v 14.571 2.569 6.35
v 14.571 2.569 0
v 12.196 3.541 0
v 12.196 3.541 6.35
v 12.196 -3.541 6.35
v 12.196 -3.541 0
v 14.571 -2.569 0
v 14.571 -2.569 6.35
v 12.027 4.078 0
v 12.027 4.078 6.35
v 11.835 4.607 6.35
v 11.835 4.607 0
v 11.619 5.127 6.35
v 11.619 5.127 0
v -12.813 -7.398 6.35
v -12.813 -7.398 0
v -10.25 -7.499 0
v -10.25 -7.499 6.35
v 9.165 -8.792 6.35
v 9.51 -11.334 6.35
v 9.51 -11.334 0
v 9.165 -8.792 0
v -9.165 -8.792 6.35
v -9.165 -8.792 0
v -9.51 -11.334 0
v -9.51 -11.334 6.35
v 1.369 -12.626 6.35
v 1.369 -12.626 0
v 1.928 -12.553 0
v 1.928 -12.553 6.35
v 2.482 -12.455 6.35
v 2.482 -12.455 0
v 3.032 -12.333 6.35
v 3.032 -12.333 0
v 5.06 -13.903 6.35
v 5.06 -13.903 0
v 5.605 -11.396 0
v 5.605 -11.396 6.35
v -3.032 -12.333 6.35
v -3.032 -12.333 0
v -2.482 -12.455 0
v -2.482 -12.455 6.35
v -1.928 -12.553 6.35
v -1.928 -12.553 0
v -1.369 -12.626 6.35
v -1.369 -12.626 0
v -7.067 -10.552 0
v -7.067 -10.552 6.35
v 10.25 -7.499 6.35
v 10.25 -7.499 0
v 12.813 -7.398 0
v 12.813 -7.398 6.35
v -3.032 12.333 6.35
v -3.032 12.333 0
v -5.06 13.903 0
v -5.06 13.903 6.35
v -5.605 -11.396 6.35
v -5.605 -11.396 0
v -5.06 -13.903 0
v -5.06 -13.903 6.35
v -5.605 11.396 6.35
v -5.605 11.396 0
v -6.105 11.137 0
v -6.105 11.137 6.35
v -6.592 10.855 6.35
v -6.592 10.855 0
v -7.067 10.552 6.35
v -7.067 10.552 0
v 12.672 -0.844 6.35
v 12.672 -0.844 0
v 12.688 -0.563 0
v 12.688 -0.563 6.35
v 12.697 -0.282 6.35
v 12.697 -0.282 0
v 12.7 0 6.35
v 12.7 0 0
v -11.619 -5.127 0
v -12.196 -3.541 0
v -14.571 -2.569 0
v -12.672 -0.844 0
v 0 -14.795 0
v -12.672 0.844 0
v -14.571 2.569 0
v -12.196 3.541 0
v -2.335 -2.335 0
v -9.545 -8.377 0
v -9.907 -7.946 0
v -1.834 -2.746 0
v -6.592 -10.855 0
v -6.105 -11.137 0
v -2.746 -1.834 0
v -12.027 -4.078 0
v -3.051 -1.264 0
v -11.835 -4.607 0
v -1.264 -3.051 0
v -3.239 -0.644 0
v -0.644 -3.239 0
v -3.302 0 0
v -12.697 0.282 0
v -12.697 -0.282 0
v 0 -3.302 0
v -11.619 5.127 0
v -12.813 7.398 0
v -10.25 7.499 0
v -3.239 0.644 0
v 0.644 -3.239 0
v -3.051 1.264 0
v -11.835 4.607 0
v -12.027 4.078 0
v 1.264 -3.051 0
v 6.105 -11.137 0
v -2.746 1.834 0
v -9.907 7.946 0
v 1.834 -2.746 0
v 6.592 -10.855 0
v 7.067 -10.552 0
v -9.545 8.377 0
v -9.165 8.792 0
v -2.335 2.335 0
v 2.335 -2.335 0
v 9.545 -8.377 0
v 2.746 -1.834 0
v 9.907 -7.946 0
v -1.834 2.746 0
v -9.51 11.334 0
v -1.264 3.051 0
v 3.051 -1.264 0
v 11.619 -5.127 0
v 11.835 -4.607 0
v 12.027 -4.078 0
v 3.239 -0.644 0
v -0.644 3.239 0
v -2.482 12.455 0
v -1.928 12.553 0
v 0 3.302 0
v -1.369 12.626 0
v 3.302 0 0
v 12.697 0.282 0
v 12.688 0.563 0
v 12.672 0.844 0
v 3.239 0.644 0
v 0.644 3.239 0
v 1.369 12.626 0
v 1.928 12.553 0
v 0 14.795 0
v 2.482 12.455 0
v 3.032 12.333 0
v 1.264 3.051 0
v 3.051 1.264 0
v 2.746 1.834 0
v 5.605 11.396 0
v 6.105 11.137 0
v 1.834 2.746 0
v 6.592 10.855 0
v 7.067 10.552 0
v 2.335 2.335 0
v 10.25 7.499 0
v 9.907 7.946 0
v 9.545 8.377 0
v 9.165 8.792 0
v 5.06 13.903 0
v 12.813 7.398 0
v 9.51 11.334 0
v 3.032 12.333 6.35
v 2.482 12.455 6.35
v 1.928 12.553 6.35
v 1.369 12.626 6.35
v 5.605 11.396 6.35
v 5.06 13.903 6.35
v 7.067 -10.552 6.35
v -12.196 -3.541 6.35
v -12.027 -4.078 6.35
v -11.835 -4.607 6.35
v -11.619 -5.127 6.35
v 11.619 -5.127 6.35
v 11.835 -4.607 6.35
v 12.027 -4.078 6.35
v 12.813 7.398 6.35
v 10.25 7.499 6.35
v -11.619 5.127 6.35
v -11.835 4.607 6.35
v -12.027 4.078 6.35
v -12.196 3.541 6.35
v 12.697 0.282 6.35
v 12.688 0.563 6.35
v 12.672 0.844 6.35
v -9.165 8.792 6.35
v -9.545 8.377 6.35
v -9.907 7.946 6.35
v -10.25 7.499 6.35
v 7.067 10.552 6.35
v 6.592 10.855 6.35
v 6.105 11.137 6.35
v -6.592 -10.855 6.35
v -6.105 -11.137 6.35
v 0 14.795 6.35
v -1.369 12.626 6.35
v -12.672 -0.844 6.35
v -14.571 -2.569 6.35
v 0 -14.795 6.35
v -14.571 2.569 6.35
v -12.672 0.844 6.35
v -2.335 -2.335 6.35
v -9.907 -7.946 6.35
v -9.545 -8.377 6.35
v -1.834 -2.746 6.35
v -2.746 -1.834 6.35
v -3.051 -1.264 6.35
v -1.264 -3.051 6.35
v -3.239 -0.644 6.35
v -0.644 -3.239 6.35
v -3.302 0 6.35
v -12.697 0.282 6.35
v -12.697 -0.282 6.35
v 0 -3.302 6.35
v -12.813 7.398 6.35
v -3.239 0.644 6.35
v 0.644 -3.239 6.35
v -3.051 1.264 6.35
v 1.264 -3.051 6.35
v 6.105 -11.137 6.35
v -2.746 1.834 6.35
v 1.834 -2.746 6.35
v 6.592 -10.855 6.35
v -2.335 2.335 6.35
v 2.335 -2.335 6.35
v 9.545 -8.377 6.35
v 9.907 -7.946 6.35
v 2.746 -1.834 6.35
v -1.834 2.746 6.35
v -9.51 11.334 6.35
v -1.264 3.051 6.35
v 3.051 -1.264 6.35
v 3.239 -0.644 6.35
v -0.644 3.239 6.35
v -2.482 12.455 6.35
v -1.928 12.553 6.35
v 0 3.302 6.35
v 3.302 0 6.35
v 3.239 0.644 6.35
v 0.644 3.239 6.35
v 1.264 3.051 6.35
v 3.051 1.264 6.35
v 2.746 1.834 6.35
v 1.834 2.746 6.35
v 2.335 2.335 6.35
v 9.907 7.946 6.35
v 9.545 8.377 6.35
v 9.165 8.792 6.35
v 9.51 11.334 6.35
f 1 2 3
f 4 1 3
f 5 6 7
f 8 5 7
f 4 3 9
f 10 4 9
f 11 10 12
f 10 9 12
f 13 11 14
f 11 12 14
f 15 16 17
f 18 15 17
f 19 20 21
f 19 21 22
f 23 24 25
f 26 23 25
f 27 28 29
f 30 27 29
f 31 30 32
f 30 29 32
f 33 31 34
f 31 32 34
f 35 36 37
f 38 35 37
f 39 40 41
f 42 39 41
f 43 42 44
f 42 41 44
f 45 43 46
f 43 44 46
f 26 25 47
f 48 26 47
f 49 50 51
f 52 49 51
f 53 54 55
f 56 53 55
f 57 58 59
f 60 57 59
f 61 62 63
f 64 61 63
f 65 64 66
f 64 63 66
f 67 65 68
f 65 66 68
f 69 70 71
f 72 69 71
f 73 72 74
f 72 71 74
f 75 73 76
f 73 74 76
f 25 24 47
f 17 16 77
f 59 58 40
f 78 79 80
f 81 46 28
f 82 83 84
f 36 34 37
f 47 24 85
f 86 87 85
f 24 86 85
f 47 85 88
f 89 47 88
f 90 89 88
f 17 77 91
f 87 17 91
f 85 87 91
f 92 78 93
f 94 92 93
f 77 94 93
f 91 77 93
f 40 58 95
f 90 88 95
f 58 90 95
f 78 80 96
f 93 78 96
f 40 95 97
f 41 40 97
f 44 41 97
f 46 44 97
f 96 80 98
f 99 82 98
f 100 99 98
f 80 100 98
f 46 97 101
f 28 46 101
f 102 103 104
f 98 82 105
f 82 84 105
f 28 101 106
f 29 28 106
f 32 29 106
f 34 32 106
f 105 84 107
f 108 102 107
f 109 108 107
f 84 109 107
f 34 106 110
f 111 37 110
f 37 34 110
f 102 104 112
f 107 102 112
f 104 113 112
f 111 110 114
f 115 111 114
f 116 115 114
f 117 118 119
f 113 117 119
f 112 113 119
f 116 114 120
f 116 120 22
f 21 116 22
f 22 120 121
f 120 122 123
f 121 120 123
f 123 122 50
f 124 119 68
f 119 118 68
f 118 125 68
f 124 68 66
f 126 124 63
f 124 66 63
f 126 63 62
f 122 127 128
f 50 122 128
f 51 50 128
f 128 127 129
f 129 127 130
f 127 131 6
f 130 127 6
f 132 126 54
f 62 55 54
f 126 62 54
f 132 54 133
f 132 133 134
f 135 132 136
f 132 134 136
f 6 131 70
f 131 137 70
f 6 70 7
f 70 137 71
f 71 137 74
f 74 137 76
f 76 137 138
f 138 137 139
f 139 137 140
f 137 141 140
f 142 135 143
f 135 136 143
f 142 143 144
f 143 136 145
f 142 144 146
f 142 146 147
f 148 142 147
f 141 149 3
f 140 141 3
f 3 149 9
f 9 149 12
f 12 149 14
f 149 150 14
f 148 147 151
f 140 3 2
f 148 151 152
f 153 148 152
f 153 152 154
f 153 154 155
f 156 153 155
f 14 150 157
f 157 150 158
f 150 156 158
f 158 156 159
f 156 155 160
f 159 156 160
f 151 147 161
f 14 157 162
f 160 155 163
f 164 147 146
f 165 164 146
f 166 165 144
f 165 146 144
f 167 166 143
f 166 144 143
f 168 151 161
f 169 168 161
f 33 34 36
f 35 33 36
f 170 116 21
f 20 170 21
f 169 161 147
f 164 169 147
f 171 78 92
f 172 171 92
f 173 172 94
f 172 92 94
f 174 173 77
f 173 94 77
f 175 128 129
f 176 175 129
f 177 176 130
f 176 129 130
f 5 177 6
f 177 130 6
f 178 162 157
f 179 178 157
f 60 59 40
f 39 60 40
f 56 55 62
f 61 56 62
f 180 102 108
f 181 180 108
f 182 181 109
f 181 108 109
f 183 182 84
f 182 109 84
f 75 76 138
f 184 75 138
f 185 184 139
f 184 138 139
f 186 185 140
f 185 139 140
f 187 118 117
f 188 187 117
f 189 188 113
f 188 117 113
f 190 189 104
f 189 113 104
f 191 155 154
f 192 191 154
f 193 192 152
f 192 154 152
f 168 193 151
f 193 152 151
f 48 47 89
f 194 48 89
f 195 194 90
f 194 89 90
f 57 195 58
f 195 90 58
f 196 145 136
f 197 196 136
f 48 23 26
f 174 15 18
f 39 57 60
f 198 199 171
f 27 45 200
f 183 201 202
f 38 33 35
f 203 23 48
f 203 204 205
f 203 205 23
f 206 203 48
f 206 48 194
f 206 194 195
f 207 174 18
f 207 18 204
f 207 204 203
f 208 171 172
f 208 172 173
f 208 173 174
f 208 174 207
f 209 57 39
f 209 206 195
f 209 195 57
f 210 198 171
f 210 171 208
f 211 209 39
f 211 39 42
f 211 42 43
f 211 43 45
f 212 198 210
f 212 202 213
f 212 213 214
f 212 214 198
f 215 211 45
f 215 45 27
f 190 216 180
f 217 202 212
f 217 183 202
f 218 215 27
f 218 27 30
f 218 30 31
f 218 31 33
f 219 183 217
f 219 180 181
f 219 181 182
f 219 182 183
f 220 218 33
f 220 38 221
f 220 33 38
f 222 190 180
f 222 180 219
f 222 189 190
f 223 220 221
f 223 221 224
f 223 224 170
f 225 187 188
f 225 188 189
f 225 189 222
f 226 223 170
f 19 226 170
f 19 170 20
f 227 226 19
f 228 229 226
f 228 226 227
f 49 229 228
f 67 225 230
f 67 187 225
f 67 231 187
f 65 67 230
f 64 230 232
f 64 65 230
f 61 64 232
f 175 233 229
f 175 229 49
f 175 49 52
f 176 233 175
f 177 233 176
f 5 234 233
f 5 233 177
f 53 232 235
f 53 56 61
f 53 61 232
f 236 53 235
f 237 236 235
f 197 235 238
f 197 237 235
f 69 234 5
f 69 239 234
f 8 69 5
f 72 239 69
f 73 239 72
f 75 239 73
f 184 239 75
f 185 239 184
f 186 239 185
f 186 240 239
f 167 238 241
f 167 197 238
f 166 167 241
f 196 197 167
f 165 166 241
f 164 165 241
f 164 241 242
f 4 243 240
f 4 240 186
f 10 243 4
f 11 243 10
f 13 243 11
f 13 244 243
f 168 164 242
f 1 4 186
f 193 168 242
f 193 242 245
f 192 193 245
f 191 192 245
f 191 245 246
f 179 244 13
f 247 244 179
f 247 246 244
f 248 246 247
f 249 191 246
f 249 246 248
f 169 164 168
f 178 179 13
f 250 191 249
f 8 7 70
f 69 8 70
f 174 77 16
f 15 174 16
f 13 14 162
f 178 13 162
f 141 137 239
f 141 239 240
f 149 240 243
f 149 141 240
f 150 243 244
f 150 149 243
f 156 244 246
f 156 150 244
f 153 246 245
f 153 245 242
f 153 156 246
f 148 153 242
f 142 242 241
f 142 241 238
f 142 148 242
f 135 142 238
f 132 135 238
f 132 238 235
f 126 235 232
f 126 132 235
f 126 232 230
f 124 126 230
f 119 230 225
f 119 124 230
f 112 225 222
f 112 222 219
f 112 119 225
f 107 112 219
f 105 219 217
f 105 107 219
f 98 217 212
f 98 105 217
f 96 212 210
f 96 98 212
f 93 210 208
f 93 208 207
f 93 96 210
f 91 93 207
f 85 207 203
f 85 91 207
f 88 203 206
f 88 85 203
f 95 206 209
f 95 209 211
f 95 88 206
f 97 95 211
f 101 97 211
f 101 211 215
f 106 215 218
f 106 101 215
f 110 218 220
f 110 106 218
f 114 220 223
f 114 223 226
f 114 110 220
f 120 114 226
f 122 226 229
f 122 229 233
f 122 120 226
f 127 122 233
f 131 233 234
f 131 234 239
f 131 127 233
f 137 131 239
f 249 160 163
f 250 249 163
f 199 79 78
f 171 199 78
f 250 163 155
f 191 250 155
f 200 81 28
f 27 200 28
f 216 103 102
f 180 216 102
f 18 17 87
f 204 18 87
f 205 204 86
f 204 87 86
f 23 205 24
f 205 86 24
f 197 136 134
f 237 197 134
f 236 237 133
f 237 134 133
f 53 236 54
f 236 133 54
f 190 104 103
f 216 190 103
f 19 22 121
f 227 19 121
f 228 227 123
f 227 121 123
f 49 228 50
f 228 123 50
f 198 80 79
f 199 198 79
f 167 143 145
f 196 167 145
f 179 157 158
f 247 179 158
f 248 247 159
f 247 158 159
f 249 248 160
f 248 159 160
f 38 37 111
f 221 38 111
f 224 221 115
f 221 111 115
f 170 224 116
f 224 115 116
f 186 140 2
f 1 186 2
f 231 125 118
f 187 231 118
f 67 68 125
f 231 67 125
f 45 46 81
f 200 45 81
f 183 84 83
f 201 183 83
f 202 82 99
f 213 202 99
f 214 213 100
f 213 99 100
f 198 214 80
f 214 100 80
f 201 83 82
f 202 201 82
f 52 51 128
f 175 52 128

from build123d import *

# Parameters (mm, degrees)
F0_R     = 3.302
F1_DEPTH = 6.35


with BuildPart() as f1:
    # F0 (on Top) → F1 (new body)
    with BuildSketch(Plane.XY):
        with BuildLine():
            ThreePointArc((12.671918, -0.844097), (12.692977, -0.422282), (12.7, 0))
            ThreePointArc((12.7, 0), (12.692977, 0.422282), (12.671918, 0.844097))
            ThreePointArc((12.671918, 0.844097), (12.507058, 2.205332), (12.196406, 3.540859))
            ThreePointArc((12.196406, 3.540859), (11.934096, 4.343656), (11.619009, 5.127243))
            ThreePointArc((11.619009, 5.127243), (10.998523, 6.35), (10.249828, 7.498736))
            ThreePointArc((10.249828, 7.498736), (9.728764, 8.163403), (9.164677, 8.791968))
            ThreePointArc((9.164677, 8.791968), (8.163403, 9.728764), (7.066969, 10.552154))
            ThreePointArc((7.066969, 10.552154), (6.35, 10.998523), (5.604949, 11.396251))
            ThreePointArc((5.604949, 11.396251), (4.343656, 11.934096), (3.031729, 12.332827))
            ThreePointArc((3.031729, 12.332827), (2.205332, 12.507058), (1.369182, 12.625979))
            ThreePointArc((1.369182, 12.625979), (0.685591, 12.681481), (0, 12.7))
            ThreePointArc((0, 12.7), (-0.685591, 12.681481), (-1.369182, 12.625979))
            ThreePointArc((-1.369182, 12.625979), (-2.205332, 12.507058), (-3.031729, 12.332827))
            ThreePointArc((-3.031729, 12.332827), (-4.343656, 11.934096), (-5.604949, 11.396251))
            ThreePointArc((-5.604949, 11.396251), (-6.35, 10.998523), (-7.066969, 10.552154))
            ThreePointArc((-7.066969, 10.552154), (-8.163403, 9.728764), (-9.164677, 8.791968))
            ThreePointArc((-9.164677, 8.791968), (-9.728764, 8.163403), (-10.249828, 7.498736))
            ThreePointArc((-10.249828, 7.498736), (-10.998523, 6.35), (-11.619009, 5.127243))
            ThreePointArc((-11.619009, 5.127243), (-11.934096, 4.343656), (-12.196406, 3.540859))
            ThreePointArc((-12.196406, 3.540859), (-12.507058, 2.205332), (-12.671918, 0.844097))
            ThreePointArc((-12.671918, 0.844097), (-12.7, 0), (-12.671918, -0.844097))
            ThreePointArc((-12.671918, -0.844097), (-12.507058, -2.205332), (-12.196406, -3.540859))
            ThreePointArc((-12.196406, -3.540859), (-11.934096, -4.343656), (-11.619009, -5.127243))
            ThreePointArc((-11.619009, -5.127243), (-10.998523, -6.35), (-10.249828, -7.498736))
            ThreePointArc((-10.249828, -7.498736), (-9.728764, -8.163403), (-9.164677, -8.791968))
            ThreePointArc((-9.164677, -8.791968), (-8.163403, -9.728764), (-7.066969, -10.552154))
            ThreePointArc((-7.066969, -10.552154), (-6.35, -10.998523), (-5.604949, -11.396251))
            ThreePointArc((-5.604949, -11.396251), (-4.343656, -11.934096), (-3.031729, -12.332827))
            ThreePointArc((-3.031729, -12.332827), (-2.205332, -12.507058), (-1.369182, -12.625979))
            ThreePointArc((-1.369182, -12.625979), (0, -12.7), (1.369182, -12.625979))
            ThreePointArc((1.369182, -12.625979), (2.205332, -12.507058), (3.031729, -12.332827))
            ThreePointArc((3.031729, -12.332827), (4.343656, -11.934096), (5.604949, -11.396251))
            ThreePointArc((5.604949, -11.396251), (6.35, -10.998523), (7.066969, -10.552154))
            ThreePointArc((7.066969, -10.552154), (8.163403, -9.728764), (9.164677, -8.791968))
            ThreePointArc((9.164677, -8.791968), (9.728764, -8.163403), (10.249828, -7.498736))
            ThreePointArc((10.249828, -7.498736), (10.998523, -6.35), (11.619009, -5.127243))
            ThreePointArc((11.619009, -5.127243), (11.934096, -4.343656), (12.196406, -3.540859))
            ThreePointArc((12.196406, -3.540859), (12.507058, -2.205332), (12.671918, -0.844097))
        make_face()
        Circle(F0_R, mode=Mode.SUBTRACT)
        with BuildLine():
            ThreePointArc((12.196406, 3.540859), (12.507058, 2.205332), (12.671918, 0.844097))
            Line((12.671918, 0.844097), (14.570677, 2.569203))
            Line((14.570677, 2.569203), (12.196406, 3.540859))
        make_face()
        with BuildLine():
            Line((14.570677, -2.569203), (12.671918, -0.844097))
            ThreePointArc((12.671918, -0.844097), (12.507058, -2.205332), (12.196406, -3.540859))
            Line((12.196406, -3.540859), (14.570677, -2.569203))
        make_face()
        with BuildLine():
            ThreePointArc((10.249828, 7.498736), (10.998523, 6.35), (11.619009, 5.127243))
            Line((11.619009, 5.127243), (12.813238, 7.397727))
            Line((12.813238, 7.397727), (10.249828, 7.498736))
        make_face()
        with BuildLine():
            Line((12.813238, -7.397727), (11.619009, -5.127243))
            ThreePointArc((11.619009, -5.127243), (10.998523, -6.35), (10.249828, -7.498736))
            Line((10.249828, -7.498736), (12.813238, -7.397727))
        make_face()
        with BuildLine():
            ThreePointArc((7.066969, 10.552154), (8.163403, 9.728764), (9.164677, 8.791968))
            Line((9.164677, 8.791968), (9.510334, 11.333975))
            Line((9.510334, 11.333975), (7.066969, 10.552154))
        make_face()
        with BuildLine():
            Line((9.510334, -11.333975), (9.164677, -8.791968))
            ThreePointArc((9.164677, -8.791968), (8.163403, -9.728764), (7.066969, -10.552154))
            Line((7.066969, -10.552154), (9.510334, -11.333975))
        make_face()
        with BuildLine():
            ThreePointArc((3.031729, 12.332827), (4.343656, 11.934096), (5.604949, 11.396251))
            Line((5.604949, 11.396251), (5.060343, 13.903178))
            Line((5.060343, 13.903178), (3.031729, 12.332827))
        make_face()
        with BuildLine():
            Line((5.060343, -13.903178), (5.604949, -11.396251))
            ThreePointArc((5.604949, -11.396251), (4.343656, -11.934096), (3.031729, -12.332827))
            Line((3.031729, -12.332827), (5.060343, -13.903178))
        make_face()
        with BuildLine():
            ThreePointArc((0, 12.7), (0.685591, 12.681481), (1.369182, 12.625979))
            Line((1.369182, 12.625979), (0, 14.795453))
            Line((0, 14.795453), (0, 12.7))
        make_face()
        with BuildLine():
            Line((0, -14.795453), (1.369182, -12.625979))
            ThreePointArc((1.369182, -12.625979), (0, -12.7), (-1.369182, -12.625979))
            Line((-1.369182, -12.625979), (0, -14.795453))
        make_face()
        with BuildLine():
            ThreePointArc((-1.369182, 12.625979), (-0.685591, 12.681481), (0, 12.7))
            Line((0, 12.7), (0, 14.795453))
            Line((0, 14.795453), (-1.369182, 12.625979))
        make_face()
        with BuildLine():
            Line((-5.060343, -13.903178), (-3.031729, -12.332827))
            ThreePointArc((-3.031729, -12.332827), (-4.343656, -11.934096), (-5.604949, -11.396251))
            Line((-5.604949, -11.396251), (-5.060343, -13.903178))
        make_face()
        with BuildLine():
            ThreePointArc((-5.604949, 11.396251), (-4.343656, 11.934096), (-3.031729, 12.332827))
            Line((-3.031729, 12.332827), (-5.060343, 13.903178))
            Line((-5.060343, 13.903178), (-5.604949, 11.396251))
        make_face()
        with BuildLine():
            Line((-9.510334, -11.333975), (-7.066969, -10.552154))
            ThreePointArc((-7.066969, -10.552154), (-8.163403, -9.728764), (-9.164677, -8.791968))
            Line((-9.164677, -8.791968), (-9.510334, -11.333975))
        make_face()
        with BuildLine():
            ThreePointArc((-9.164677, 8.791968), (-8.163403, 9.728764), (-7.066969, 10.552154))
            Line((-7.066969, 10.552154), (-9.510334, 11.333975))
            Line((-9.510334, 11.333975), (-9.164677, 8.791968))
        make_face()
        with BuildLine():
            Line((-12.813238, -7.397727), (-10.249828, -7.498736))
            ThreePointArc((-10.249828, -7.498736), (-10.998523, -6.35), (-11.619009, -5.127243))
            Line((-11.619009, -5.127243), (-12.813238, -7.397727))
        make_face()
        with BuildLine():
            ThreePointArc((-11.619009, 5.127243), (-10.998523, 6.35), (-10.249828, 7.498736))
            Line((-10.249828, 7.498736), (-12.813238, 7.397727))
            Line((-12.813238, 7.397727), (-11.619009, 5.127243))
        make_face()
        with BuildLine():
            Line((-14.570677, -2.569203), (-12.196406, -3.540859))
            ThreePointArc((-12.196406, -3.540859), (-12.507058, -2.205332), (-12.671918, -0.844097))
            Line((-12.671918, -0.844097), (-14.570677, -2.569203))
        make_face()
        with BuildLine():
            ThreePointArc((-12.671918, 0.844097), (-12.507058, 2.205332), (-12.196406, 3.540859))
            Line((-12.196406, 3.540859), (-14.570677, 2.569203))
            Line((-14.570677, 2.569203), (-12.671918, 0.844097))
        make_face()
    extrude(amount=F1_DEPTH)


solid = f1.part
